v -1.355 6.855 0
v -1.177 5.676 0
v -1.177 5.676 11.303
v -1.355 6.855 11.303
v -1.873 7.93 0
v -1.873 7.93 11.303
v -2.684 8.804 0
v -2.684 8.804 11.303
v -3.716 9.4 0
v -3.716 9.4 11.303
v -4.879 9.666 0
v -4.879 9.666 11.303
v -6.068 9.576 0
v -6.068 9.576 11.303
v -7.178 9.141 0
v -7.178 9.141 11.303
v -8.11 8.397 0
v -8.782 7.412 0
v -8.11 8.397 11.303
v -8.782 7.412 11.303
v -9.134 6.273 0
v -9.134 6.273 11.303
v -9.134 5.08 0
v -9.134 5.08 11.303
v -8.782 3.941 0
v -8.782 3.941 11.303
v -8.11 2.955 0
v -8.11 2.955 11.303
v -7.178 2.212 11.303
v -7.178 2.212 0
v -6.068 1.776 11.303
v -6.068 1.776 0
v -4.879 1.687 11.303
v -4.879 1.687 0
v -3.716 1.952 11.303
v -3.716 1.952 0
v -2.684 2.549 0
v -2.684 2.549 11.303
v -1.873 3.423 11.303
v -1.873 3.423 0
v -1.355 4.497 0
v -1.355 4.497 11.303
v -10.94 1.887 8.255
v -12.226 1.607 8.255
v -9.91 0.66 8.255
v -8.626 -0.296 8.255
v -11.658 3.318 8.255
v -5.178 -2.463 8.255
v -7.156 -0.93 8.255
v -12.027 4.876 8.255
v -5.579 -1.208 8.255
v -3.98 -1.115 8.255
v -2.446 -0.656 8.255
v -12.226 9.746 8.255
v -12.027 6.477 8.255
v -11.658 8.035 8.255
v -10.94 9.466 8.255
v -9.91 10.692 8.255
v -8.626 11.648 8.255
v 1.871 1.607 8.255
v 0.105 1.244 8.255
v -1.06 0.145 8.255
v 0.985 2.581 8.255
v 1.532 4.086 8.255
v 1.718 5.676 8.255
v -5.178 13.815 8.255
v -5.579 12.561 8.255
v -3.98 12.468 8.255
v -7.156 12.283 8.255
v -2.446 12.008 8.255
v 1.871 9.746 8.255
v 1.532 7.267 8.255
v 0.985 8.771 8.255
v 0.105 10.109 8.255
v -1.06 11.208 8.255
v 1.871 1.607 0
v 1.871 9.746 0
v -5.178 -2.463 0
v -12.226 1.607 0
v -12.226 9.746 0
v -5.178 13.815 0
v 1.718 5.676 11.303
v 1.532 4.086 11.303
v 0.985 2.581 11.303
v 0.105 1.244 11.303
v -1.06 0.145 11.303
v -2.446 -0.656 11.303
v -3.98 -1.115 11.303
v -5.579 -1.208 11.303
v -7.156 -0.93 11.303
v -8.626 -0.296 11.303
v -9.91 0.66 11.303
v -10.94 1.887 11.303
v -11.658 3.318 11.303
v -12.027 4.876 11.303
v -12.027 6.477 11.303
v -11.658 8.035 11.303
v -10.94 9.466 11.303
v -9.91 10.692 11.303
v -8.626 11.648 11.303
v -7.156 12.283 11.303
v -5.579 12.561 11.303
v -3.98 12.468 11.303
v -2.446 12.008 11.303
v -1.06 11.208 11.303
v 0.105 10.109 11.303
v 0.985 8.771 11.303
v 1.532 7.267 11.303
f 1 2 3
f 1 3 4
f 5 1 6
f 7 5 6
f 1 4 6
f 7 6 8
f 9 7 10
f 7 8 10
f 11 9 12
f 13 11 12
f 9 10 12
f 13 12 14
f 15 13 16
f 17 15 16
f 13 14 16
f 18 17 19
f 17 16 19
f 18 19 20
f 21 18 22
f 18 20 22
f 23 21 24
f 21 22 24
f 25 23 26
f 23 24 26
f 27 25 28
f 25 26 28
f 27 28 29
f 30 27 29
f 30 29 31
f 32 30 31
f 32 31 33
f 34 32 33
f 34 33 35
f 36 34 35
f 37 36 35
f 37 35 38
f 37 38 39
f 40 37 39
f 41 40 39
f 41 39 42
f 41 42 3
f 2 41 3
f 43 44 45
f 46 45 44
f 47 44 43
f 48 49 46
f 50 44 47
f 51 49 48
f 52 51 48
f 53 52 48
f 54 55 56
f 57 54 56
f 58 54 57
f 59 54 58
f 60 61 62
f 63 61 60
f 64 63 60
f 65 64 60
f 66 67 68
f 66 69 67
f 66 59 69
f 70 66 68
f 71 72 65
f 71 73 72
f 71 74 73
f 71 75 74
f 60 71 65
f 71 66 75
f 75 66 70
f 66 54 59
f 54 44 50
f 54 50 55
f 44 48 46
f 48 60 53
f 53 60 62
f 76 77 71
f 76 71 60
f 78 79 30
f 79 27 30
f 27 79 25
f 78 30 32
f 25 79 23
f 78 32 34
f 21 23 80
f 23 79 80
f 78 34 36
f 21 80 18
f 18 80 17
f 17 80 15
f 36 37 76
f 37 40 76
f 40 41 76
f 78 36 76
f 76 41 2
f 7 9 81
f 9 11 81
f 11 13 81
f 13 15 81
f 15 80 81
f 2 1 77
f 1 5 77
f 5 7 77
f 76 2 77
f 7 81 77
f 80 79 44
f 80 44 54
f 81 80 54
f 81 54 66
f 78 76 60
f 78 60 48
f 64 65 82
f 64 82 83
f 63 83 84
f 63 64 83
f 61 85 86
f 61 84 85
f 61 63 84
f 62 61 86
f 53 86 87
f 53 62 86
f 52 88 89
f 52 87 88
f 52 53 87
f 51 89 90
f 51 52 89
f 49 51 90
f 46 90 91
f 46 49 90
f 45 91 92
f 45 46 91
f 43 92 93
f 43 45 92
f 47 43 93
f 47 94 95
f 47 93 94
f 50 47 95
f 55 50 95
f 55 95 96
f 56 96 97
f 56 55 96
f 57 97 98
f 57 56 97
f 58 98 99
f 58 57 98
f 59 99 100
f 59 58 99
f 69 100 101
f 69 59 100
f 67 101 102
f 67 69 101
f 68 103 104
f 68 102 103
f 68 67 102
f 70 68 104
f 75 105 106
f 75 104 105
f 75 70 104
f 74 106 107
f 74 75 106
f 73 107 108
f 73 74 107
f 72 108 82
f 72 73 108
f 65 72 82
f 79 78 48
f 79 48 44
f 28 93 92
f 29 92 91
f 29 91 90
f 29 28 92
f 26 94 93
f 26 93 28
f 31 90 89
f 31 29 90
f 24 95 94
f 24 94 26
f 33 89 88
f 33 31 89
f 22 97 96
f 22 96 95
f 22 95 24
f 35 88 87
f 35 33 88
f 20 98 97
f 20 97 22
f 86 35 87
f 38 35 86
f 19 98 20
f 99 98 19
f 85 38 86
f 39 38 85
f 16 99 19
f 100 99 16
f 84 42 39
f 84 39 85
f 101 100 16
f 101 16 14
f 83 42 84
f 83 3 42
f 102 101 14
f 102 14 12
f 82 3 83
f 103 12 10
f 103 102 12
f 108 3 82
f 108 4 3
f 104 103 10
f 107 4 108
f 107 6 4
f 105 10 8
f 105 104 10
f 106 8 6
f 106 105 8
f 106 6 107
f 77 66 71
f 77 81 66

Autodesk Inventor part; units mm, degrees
ref_plane "YZ Plane" through (0, 0, 0) normal (1, 0, 0) x (0, 1, 0)
ref_plane "XZ Plane" through (0, 0, 0) normal (0, 1, 0) x (-1, 0, 0)
ref_plane "XY Plane" through (0, 0, 0) normal (0, 0, 1) x (1, 0, 0)
sketch "Sketch1" plane through (0, 0, 0) normal (0, 0, 1) x (1, 0, 0)
  line L0 (-12.2264, 9.7457) -> (-5.1779, 13.8152)
  line L1 (-5.1779, 13.8152) -> (1.8706, 9.7457)
  line L2 (1.8706, 9.7457) -> (1.8706, 1.6068)
  line L3 (1.8706, 1.6068) -> (-5.1779, -2.4626)
  line L4 (-5.1779, -2.4626) -> (-12.2264, 1.6068)
  line L5 (-12.2264, 1.6068) -> (-12.2264, 9.7457)
  point P0 (0, 0)
  point P1 (-5.1779, 5.6763)
  dimension "d0" = 14.097
extrude "Extrusion1" add sketch "Sketch1" along normal blind 8.255
sketch "Sketch2" plane through (0, 0, 8.255) normal (0, 0, 1) x (1, 0, 0)
  circle A0 centre (-5.1779, 5.6763) radius 6.8961
  point P0 (0, 0)
  dimension "d3" = 13.7922
extrude "Extrusion2" add sketch "Sketch2" along normal blind 3.048
sketch "Sketch3" plane through (-5.1779, 5.6763, 11.303) normal (0, 0, 1) x (1, 0, 0)
  circle A0 centre (0, 0) radius 6.8961 projected
  circle A1 centre (0, 0) radius 4.0005
  point P0 (5.1779, -5.6763)
  dimension "d6" = 8.001
extrude "Extrusion3" cut sketch "Sketch3" against normal through all contours A1
thread "Thread1" size "3/8-16 UNC" class "2B" standard "ANSI Unified Screw Threads" full length
properties part number "Big Nut 1764"
